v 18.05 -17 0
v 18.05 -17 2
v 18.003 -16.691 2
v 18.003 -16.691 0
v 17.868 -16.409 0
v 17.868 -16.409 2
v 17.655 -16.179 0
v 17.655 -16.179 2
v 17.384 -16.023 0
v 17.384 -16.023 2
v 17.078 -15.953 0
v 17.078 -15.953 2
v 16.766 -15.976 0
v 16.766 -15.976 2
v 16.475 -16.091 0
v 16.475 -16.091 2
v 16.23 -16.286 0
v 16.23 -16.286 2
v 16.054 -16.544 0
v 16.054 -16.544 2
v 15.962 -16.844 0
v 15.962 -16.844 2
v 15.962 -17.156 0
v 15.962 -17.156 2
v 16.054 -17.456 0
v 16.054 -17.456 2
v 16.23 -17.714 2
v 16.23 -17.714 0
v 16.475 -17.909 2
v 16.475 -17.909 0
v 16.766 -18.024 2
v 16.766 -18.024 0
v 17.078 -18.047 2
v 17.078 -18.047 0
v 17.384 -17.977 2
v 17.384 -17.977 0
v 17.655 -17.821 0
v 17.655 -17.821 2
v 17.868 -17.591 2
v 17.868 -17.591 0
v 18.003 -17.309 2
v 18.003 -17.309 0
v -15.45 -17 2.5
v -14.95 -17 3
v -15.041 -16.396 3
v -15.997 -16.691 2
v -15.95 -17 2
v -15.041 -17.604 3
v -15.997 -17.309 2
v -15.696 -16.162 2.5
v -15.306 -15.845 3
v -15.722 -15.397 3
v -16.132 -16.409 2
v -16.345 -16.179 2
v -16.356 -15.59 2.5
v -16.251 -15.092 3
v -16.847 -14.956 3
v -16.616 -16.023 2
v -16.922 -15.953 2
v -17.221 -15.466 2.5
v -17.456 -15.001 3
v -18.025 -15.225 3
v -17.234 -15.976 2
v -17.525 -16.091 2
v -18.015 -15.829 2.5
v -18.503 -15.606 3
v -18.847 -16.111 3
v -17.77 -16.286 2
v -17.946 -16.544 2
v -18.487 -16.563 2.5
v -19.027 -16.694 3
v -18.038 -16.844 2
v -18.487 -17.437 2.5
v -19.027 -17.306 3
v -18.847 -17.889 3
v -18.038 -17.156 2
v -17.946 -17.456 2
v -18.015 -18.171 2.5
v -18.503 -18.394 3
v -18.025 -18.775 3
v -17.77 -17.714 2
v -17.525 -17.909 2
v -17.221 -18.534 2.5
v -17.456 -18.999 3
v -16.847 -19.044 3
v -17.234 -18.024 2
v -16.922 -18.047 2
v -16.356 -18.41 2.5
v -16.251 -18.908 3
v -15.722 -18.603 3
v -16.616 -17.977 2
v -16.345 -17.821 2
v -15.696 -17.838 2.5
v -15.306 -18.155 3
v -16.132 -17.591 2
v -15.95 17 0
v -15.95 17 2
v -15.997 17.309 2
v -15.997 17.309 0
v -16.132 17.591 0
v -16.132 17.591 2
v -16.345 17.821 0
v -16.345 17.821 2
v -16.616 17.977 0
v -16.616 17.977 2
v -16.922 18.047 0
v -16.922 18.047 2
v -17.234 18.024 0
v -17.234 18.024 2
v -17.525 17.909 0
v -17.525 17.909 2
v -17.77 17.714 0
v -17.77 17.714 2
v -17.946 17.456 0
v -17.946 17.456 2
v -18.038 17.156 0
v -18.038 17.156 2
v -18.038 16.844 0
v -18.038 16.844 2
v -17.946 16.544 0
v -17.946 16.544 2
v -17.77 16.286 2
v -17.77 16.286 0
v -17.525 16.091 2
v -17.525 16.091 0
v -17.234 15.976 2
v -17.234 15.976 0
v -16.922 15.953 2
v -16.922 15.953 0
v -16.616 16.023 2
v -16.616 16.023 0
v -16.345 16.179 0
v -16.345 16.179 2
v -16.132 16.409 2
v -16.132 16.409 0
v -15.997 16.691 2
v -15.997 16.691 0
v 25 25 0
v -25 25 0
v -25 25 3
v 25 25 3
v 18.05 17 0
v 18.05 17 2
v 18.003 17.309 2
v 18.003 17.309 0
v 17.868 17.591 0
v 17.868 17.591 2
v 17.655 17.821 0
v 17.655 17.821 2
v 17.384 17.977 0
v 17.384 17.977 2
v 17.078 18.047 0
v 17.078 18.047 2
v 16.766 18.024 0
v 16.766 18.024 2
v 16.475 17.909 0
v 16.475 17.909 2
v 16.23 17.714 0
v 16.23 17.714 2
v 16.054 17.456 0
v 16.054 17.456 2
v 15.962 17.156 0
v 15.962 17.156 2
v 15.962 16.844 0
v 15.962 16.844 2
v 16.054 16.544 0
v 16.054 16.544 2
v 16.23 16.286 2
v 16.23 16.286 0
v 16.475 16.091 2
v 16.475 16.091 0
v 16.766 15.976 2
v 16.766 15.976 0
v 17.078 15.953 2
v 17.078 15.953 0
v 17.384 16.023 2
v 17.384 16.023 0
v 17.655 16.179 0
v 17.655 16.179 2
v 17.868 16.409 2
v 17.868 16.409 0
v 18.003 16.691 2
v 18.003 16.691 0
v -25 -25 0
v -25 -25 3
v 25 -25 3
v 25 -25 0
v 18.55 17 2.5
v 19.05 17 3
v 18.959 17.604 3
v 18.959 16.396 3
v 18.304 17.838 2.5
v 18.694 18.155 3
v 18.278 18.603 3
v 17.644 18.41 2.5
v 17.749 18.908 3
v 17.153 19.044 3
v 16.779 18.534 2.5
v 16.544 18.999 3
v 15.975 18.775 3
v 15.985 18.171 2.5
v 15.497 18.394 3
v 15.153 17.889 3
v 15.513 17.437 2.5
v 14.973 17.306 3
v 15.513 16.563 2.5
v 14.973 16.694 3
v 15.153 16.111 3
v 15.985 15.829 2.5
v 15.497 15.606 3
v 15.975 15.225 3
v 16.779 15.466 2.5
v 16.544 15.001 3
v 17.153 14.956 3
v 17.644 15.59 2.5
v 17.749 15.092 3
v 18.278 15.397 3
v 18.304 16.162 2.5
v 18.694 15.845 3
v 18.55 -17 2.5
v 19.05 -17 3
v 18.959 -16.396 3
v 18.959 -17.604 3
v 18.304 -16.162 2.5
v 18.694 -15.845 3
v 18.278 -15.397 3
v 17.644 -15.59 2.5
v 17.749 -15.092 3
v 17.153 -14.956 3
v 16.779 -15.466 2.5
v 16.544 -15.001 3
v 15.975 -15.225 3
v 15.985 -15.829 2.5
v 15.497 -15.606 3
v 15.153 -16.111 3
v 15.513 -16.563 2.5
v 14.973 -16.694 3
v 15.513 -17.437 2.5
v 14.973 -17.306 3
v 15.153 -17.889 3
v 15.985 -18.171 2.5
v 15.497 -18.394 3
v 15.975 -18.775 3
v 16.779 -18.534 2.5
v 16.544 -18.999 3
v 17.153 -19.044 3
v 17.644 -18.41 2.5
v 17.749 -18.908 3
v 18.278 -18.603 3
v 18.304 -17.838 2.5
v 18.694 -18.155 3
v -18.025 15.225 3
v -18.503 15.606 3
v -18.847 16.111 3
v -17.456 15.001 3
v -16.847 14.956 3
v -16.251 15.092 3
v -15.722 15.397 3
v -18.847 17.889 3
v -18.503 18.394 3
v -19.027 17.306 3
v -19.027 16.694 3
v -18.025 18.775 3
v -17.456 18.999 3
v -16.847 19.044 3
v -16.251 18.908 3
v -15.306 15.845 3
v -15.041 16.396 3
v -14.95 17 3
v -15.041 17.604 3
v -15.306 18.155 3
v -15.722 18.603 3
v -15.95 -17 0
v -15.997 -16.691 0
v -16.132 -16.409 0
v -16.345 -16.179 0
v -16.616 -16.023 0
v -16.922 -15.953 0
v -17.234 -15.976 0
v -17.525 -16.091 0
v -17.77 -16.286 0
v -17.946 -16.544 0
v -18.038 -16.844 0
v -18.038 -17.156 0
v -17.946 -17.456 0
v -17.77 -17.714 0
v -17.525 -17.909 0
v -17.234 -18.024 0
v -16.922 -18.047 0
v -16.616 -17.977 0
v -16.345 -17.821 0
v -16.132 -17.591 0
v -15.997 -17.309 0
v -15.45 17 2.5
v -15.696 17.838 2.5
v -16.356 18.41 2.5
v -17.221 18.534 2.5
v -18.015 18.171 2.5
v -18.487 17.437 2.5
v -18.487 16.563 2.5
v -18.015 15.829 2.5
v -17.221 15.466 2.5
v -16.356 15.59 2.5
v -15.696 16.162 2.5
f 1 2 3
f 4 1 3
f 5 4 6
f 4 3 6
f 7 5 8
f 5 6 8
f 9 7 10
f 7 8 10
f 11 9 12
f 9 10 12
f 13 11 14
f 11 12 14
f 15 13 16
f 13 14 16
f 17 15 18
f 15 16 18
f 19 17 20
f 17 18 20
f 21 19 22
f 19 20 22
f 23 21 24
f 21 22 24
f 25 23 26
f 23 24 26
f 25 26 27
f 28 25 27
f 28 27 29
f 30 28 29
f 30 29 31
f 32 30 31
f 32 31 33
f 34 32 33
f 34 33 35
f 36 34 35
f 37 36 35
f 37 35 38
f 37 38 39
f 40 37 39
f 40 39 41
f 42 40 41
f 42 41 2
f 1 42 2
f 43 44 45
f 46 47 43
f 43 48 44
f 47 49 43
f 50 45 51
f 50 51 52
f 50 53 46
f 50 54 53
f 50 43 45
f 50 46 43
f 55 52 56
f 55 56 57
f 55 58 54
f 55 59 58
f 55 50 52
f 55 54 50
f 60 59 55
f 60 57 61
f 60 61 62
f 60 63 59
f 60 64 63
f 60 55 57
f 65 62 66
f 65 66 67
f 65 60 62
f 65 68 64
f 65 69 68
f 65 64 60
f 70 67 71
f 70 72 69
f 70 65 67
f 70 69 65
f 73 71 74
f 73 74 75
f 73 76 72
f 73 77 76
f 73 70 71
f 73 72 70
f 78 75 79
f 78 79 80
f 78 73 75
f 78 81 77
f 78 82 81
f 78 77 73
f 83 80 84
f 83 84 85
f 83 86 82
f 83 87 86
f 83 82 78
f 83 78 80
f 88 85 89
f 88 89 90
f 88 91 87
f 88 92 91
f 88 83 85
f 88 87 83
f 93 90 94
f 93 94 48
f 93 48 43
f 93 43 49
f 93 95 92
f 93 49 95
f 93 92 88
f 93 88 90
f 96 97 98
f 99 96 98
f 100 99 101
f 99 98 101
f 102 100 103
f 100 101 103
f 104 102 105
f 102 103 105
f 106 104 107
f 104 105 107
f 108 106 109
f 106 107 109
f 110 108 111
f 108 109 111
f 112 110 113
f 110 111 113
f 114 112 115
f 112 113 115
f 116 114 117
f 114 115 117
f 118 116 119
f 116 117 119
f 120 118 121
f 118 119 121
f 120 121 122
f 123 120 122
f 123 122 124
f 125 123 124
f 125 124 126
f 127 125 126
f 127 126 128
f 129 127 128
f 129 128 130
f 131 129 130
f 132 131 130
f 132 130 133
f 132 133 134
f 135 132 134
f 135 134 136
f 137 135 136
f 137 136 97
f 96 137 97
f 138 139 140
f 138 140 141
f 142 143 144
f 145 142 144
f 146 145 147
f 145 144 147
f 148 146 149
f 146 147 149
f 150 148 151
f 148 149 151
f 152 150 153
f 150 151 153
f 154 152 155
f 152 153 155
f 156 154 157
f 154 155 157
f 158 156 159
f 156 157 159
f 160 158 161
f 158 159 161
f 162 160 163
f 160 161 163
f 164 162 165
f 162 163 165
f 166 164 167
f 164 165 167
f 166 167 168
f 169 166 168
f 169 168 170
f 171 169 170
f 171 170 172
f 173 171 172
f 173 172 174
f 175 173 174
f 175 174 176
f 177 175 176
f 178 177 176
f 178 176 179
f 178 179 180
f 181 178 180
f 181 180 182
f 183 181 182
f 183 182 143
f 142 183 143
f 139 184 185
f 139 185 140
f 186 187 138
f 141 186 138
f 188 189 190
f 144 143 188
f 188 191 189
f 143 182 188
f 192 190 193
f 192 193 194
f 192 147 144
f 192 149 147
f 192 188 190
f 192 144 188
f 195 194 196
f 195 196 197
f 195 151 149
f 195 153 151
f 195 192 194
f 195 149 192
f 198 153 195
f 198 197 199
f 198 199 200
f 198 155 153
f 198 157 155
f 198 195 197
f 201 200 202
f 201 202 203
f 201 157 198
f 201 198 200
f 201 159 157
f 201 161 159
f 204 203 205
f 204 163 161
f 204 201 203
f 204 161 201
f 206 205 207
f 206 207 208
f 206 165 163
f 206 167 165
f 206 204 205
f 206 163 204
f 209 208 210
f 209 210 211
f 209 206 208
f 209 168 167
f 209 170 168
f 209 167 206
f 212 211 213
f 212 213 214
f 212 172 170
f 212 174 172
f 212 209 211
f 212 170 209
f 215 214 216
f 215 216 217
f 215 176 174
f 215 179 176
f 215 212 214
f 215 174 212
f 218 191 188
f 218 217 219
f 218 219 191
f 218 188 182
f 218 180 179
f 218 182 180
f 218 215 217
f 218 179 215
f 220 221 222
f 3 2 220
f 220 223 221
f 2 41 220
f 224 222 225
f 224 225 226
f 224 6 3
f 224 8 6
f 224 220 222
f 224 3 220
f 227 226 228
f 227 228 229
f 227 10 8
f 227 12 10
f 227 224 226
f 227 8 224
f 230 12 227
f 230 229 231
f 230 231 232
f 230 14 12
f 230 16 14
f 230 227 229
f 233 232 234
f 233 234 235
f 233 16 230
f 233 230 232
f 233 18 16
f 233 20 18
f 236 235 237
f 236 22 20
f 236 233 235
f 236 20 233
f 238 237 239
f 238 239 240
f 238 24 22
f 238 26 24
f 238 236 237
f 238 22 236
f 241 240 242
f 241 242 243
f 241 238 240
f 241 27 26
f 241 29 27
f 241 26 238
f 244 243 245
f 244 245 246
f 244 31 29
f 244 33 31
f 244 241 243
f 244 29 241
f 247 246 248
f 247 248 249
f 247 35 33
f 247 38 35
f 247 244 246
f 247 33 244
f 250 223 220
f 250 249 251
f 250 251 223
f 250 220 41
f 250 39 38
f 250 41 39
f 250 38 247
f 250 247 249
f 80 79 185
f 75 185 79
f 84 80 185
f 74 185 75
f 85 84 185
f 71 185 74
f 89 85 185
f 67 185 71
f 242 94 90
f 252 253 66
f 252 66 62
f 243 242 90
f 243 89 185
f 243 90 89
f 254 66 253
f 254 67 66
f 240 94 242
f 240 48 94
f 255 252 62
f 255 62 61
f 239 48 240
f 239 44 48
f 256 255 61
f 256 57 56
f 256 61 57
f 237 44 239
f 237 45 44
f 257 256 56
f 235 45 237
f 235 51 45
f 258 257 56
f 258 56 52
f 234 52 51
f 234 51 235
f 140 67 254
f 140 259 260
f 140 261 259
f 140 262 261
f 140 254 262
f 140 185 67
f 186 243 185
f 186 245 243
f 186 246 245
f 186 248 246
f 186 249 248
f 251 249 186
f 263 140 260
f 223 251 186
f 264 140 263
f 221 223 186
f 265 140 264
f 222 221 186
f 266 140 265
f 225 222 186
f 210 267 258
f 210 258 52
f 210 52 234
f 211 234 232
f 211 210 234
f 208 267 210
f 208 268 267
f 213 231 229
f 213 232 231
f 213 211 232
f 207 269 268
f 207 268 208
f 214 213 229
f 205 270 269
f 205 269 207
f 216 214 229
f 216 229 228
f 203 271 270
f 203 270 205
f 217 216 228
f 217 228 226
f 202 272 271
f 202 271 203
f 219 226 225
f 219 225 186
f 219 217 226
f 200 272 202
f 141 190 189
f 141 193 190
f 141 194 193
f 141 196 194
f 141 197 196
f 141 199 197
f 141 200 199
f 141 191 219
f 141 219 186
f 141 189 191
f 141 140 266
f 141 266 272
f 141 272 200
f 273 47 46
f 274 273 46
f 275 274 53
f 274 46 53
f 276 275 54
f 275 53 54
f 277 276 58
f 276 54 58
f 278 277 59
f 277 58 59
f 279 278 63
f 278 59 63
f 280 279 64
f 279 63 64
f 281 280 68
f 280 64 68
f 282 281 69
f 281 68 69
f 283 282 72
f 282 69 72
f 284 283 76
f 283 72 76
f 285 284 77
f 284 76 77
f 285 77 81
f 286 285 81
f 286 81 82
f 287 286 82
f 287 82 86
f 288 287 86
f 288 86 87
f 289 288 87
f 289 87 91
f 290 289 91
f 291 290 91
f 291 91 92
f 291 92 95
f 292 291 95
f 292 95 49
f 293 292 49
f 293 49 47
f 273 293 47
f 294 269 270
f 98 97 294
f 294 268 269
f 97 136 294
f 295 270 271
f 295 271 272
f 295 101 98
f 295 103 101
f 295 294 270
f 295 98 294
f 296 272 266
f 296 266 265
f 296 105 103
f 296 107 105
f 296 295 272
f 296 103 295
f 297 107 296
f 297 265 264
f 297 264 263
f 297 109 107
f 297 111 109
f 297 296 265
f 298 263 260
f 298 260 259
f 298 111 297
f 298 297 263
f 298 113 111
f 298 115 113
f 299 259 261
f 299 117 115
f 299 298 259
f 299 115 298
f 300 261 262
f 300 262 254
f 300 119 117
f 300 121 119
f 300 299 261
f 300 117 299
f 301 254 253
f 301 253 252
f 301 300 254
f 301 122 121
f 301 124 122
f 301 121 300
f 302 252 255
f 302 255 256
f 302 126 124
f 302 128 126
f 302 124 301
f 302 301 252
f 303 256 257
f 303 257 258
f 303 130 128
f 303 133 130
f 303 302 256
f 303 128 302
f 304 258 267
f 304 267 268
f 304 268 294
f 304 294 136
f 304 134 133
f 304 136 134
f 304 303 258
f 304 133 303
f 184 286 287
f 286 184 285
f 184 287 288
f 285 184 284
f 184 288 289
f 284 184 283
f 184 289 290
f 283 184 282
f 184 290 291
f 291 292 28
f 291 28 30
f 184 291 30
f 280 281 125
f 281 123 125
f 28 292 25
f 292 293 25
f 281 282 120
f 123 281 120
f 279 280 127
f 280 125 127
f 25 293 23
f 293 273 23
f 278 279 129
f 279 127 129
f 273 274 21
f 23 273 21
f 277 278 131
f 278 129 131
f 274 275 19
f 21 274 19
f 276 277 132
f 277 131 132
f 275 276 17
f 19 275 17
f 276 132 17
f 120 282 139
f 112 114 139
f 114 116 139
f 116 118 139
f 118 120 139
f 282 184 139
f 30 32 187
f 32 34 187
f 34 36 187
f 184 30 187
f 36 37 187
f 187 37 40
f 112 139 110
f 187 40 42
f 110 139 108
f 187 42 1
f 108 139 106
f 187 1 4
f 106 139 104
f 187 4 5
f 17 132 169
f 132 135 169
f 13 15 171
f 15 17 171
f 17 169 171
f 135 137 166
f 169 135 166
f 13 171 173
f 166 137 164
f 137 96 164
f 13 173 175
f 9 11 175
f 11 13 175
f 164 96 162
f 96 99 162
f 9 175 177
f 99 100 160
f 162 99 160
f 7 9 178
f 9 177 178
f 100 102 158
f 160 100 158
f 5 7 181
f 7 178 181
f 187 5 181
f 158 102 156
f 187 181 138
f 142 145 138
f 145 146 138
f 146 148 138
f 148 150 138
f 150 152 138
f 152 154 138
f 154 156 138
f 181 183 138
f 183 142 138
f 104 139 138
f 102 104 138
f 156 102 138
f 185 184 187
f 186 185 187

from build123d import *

# Parameters (mm, degrees)
SKETCH_W     = 50
SKETCH_H     = 50
PAD_DEPTH    = 3
SKETCH001_R  = 1.05
POCKET_DEPTH = 3.001
CHAMFER_SIZE = 1


with BuildPart() as part:
    # Sketch → Pad (new body)
    with BuildSketch(Plane.XY):
        Rectangle(SKETCH_W, SKETCH_H)
    extrude(amount=PAD_DEPTH)

    # Sketch001 (on Face6 of Pad) → Pocket (cut, through all)
    with BuildSketch(Plane.XY.offset(3)):
        with Locations((-17, 17)):
            Circle(SKETCH001_R)
        with Locations((17, 17)):
            Circle(SKETCH001_R)
        with Locations((17, -17)):
            Circle(SKETCH001_R)
        with Locations((-17, -17)):
            Circle(SKETCH001_R)
    extrude(amount=-POCKET_DEPTH, mode=Mode.SUBTRACT)

    # Chamfer
    chamfer_edges = [part.edges().sort_by_distance(p)[0] for p in [
        (-18.05, 17, 3),
        (15.95, 17, 3),
        (15.95, -17, 3),
        (-18.05, -17, 3),
    ]]
    chamfer(chamfer_edges, length=CHAMFER_SIZE)


solid = part.part
